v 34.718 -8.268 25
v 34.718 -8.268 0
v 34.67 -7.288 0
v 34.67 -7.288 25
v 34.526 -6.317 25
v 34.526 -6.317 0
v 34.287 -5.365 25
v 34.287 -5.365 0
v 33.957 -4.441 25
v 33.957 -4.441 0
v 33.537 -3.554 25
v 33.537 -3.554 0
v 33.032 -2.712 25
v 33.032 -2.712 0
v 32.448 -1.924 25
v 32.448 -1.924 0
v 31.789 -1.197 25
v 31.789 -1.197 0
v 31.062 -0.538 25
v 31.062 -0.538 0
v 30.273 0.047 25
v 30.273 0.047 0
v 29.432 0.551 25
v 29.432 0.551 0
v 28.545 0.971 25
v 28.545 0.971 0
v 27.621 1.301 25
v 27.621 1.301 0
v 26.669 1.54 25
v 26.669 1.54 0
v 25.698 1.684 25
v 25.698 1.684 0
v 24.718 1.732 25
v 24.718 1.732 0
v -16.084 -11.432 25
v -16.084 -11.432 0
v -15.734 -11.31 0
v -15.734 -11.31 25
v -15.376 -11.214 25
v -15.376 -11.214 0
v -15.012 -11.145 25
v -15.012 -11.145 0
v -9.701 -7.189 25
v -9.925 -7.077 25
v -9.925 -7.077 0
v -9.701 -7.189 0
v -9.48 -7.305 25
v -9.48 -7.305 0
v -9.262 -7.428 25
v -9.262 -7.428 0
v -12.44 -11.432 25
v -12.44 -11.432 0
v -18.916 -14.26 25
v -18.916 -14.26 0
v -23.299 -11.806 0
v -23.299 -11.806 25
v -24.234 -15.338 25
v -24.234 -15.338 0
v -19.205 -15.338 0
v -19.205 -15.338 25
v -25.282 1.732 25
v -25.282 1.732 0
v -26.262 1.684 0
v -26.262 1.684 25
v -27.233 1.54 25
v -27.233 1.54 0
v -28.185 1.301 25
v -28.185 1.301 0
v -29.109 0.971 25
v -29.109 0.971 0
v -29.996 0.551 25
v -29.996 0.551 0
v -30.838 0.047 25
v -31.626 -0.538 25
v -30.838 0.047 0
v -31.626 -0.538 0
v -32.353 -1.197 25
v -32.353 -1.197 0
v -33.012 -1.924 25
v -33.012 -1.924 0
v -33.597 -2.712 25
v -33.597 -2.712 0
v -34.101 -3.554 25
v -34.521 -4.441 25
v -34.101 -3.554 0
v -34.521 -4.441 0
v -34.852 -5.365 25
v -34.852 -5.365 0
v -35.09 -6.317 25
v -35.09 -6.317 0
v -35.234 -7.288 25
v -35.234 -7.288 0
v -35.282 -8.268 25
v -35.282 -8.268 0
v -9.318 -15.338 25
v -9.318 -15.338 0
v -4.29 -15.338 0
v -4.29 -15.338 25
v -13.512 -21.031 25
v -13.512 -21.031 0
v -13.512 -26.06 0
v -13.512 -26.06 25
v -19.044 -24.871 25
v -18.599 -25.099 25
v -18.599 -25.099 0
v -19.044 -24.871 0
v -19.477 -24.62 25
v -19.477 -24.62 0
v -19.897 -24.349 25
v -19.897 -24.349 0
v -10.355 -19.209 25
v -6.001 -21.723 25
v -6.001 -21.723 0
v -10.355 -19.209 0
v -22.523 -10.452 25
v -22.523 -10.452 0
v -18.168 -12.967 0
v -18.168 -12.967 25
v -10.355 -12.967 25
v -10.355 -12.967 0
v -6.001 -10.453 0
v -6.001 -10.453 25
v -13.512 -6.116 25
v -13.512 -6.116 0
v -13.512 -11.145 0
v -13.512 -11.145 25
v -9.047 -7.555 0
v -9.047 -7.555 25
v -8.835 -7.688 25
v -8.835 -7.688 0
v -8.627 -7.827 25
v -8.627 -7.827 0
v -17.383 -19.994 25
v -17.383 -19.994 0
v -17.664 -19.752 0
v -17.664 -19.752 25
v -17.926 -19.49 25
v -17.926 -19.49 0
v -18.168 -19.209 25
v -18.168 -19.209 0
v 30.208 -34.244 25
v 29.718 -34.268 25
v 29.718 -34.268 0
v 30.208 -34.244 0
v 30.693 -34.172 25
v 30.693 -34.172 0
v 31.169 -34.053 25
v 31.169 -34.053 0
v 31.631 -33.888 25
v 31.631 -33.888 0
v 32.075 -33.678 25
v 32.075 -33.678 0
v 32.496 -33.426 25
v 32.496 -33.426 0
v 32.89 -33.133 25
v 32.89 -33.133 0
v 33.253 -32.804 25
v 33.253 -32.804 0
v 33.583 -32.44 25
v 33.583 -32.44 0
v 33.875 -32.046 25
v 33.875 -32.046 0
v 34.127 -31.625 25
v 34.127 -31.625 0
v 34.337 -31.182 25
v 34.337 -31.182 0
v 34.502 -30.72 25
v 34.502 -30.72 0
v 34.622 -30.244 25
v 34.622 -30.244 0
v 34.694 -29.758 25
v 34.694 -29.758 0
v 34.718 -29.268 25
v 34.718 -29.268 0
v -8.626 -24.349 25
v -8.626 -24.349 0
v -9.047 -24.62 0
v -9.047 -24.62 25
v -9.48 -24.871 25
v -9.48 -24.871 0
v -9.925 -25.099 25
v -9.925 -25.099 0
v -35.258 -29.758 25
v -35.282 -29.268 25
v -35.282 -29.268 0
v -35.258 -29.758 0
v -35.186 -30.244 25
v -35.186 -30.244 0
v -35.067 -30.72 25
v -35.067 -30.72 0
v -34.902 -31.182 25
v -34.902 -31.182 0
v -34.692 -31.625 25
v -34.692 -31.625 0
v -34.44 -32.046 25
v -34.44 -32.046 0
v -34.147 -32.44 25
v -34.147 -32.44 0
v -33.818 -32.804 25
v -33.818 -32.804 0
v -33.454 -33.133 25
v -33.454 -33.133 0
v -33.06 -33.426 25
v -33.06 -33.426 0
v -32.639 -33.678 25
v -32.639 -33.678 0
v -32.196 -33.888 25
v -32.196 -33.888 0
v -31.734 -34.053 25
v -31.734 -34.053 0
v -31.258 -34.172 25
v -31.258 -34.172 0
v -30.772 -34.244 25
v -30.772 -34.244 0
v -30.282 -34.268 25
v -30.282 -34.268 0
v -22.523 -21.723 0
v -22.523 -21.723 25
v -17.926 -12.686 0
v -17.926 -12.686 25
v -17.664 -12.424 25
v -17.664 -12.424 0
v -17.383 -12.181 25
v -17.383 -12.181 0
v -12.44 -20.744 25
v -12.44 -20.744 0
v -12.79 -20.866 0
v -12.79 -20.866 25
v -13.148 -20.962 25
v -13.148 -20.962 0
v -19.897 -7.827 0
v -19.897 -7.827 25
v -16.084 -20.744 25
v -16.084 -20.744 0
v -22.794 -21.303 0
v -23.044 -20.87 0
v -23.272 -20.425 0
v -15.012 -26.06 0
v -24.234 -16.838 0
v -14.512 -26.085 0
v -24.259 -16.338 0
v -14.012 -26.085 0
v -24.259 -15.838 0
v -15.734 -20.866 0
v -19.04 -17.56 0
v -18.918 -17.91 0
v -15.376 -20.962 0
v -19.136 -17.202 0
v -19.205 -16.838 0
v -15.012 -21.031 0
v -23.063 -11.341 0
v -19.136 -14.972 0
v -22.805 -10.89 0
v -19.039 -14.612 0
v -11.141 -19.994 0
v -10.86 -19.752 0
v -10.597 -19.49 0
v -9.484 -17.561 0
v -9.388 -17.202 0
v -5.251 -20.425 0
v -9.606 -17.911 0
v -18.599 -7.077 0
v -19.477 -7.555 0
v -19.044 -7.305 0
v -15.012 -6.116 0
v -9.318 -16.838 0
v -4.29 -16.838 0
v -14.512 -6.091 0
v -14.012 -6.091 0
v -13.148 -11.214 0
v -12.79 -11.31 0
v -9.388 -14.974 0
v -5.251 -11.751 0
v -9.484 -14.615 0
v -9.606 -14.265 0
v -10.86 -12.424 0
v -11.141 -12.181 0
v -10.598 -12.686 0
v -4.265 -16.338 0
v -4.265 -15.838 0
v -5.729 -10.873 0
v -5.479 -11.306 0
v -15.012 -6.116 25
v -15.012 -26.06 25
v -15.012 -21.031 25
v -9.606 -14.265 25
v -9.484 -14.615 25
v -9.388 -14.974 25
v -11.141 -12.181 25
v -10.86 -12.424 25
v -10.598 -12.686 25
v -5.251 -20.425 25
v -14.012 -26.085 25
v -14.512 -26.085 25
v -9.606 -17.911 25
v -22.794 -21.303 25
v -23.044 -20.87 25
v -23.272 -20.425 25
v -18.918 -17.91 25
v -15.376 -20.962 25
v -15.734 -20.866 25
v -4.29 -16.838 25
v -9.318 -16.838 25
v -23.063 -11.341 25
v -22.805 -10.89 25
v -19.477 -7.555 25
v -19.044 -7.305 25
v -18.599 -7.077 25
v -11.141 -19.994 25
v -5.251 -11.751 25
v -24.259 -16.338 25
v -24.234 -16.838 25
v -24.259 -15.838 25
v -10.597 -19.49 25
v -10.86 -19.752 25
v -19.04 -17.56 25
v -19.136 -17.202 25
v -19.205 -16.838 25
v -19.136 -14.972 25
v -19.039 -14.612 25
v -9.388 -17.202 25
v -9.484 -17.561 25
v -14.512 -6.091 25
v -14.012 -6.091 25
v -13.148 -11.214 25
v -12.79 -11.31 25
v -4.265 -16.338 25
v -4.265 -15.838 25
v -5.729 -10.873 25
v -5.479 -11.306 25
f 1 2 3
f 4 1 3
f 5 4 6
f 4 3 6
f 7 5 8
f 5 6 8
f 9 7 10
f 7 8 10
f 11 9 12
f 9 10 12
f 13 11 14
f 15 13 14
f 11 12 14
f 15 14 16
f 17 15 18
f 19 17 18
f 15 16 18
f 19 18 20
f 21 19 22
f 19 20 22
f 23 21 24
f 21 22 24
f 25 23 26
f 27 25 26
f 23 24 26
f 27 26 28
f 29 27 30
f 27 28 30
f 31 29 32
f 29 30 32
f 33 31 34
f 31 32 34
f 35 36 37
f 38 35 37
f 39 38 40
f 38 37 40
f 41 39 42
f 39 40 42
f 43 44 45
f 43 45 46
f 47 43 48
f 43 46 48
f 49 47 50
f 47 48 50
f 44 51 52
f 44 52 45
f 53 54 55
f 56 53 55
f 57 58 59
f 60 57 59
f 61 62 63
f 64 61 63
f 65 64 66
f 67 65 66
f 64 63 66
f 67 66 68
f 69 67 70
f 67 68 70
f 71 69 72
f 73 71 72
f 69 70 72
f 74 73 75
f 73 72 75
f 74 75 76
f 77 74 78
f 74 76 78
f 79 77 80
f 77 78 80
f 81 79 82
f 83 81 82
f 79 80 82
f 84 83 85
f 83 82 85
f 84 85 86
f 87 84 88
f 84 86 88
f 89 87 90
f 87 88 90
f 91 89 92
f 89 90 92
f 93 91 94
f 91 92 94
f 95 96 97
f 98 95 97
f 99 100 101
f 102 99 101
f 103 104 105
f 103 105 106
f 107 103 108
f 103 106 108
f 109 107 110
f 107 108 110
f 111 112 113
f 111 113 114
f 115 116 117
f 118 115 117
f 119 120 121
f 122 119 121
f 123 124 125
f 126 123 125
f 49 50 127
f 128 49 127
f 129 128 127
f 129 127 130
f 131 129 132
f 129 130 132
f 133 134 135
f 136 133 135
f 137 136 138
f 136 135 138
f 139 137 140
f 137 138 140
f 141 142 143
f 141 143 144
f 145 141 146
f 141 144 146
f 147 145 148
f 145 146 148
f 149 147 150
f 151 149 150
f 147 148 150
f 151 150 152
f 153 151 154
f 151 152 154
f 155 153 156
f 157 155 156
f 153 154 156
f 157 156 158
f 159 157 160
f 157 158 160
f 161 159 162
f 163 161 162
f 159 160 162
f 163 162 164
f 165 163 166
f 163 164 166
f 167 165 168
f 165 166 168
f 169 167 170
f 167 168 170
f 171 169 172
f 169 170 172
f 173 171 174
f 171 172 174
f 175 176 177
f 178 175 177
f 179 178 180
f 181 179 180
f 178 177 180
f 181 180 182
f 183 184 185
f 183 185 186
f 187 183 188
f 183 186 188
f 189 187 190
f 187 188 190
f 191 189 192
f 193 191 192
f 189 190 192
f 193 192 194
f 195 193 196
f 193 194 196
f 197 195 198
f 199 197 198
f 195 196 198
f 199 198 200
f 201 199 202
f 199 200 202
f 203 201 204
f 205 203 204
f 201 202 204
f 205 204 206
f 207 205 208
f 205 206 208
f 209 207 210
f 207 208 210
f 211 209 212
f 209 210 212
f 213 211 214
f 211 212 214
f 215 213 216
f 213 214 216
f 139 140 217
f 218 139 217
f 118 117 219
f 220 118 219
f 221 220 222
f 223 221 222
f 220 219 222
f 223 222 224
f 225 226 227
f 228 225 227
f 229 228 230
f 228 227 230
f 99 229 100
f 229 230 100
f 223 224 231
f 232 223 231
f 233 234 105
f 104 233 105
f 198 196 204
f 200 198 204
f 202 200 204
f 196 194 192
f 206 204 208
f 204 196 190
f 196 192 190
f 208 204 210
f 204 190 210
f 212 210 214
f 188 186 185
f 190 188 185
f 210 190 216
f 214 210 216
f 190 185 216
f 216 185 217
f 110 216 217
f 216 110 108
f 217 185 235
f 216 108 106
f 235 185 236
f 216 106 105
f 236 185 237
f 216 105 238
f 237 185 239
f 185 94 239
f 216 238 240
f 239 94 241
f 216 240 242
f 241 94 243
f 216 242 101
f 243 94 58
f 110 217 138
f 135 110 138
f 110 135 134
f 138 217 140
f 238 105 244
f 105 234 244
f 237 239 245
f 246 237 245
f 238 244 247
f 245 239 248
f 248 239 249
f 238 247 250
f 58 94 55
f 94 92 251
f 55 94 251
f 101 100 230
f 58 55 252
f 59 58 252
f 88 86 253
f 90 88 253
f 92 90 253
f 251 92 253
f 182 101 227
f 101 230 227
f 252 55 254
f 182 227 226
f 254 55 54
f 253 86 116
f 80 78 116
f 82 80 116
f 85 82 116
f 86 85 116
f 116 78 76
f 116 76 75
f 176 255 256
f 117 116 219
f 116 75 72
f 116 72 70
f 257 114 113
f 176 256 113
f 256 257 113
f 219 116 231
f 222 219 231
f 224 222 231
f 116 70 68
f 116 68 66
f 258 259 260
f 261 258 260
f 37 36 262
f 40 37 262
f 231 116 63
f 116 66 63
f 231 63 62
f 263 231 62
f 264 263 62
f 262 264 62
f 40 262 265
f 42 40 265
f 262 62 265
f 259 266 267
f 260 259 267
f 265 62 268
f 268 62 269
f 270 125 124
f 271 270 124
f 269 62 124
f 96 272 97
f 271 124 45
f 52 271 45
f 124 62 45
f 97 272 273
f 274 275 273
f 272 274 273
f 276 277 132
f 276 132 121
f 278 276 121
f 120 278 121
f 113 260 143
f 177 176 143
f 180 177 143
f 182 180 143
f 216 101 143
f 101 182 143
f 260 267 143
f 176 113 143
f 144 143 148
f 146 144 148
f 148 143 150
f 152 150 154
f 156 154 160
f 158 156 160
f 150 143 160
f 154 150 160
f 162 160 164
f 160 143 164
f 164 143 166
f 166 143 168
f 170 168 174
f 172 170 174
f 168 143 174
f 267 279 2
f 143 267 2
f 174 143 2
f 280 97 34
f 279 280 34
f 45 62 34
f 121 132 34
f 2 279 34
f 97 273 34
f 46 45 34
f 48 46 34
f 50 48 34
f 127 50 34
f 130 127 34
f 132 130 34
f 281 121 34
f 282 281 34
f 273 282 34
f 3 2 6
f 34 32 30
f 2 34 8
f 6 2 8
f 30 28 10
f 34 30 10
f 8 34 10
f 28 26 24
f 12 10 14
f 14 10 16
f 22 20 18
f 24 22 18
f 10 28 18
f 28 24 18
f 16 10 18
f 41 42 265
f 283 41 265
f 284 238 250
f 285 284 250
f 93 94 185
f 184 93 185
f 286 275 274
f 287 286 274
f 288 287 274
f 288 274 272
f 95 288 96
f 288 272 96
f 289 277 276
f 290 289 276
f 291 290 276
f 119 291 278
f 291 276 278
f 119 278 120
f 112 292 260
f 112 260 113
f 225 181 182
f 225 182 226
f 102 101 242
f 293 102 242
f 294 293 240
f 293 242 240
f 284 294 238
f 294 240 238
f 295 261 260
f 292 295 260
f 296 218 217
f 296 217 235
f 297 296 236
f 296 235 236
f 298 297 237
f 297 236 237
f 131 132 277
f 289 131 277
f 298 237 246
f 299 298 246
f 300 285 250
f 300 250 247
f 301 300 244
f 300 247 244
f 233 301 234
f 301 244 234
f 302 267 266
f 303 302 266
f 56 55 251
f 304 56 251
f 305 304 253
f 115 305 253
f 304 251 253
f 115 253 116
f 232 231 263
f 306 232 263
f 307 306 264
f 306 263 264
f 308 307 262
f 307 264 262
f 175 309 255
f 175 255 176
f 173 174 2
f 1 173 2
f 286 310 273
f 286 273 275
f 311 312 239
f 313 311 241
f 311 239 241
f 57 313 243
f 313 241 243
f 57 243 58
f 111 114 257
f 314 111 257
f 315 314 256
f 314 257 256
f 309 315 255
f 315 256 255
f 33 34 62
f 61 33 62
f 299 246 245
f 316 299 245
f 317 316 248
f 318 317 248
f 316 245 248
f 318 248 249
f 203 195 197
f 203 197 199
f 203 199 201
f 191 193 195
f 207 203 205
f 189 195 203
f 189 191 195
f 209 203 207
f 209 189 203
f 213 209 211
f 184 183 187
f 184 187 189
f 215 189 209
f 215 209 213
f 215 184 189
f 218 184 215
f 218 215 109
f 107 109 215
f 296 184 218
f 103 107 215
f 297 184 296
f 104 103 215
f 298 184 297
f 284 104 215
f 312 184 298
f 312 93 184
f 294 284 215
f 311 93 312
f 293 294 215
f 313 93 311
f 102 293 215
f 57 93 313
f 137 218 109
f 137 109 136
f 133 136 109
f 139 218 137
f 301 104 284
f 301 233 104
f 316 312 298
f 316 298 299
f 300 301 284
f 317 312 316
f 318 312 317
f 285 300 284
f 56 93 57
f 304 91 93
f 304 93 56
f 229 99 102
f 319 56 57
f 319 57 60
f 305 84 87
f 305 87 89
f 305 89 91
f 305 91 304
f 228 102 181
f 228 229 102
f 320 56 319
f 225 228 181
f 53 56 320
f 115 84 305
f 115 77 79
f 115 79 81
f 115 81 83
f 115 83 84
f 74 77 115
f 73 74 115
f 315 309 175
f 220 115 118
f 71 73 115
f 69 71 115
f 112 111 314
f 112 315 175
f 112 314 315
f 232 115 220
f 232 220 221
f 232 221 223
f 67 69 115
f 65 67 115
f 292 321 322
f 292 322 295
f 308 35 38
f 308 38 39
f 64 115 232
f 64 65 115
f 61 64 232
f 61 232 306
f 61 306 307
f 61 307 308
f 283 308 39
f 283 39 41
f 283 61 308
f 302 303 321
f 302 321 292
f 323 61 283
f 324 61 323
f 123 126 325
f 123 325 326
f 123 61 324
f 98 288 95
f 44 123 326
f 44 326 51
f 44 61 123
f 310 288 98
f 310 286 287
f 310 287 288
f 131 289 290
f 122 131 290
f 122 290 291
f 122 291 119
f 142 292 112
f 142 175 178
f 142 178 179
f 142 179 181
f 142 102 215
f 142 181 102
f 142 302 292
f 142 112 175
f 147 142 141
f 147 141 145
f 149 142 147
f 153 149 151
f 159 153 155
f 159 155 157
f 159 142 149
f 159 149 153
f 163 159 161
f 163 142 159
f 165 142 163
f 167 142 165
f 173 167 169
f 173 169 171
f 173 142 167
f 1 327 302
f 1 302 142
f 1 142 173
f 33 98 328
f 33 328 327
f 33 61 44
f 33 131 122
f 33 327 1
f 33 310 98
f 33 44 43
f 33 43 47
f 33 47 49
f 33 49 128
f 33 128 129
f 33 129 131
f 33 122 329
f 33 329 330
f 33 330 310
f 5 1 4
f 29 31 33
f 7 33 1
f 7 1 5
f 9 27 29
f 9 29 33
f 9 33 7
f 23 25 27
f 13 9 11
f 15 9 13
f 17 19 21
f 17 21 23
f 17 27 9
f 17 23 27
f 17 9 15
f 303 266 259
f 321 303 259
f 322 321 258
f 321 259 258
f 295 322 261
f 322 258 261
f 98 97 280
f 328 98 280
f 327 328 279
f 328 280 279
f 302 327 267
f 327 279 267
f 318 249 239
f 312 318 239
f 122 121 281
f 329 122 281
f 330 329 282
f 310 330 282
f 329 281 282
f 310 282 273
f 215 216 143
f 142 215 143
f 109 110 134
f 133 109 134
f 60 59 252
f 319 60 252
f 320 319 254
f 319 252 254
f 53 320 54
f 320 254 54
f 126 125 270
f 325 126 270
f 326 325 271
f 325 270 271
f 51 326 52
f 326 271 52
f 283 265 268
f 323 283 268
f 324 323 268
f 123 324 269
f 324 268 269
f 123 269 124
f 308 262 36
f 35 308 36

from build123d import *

# Parameters (mm, degrees)
F1_DEPTH = 25


with BuildPart() as f1:
    # F0 (on Top) → F1 (new body)
    with BuildSketch(Plane.XY):
        with BuildLine():
            ThreePointArc((-35.28226, -29.26819), (-33.817794, -32.803724), (-30.28226, -34.26819))
            Line((-30.28226, -34.26819), (29.71774, -34.26819))
            ThreePointArc((29.71774, -34.26819), (33.253274, -32.803724), (34.71774, -29.26819))
            Line((34.71774, -29.26819), (34.71774, -8.26819))
            ThreePointArc((34.71774, -8.26819), (31.788808, -1.197122), (24.71774, 1.73181))
            Line((24.71774, 1.73181), (-25.28226, 1.73181))
            ThreePointArc((-25.28226, 1.73181), (-32.353327, -1.197122), (-35.28226, -8.26819))
            Line((-35.28226, -8.26819), (-35.28226, -29.26819))
        make_face()
        with BuildLine():
            ThreePointArc((-16.084487, -11.432007), (-15.556147, -11.258388), (-15.011794, -11.144518))
            Line((-15.011794, -11.144518), (-15.011794, -6.116113))
            ThreePointArc((-15.011794, -6.116113), (-14.261794, -6.087948), (-13.511794, -6.116113))
            Line((-13.511794, -6.116113), (-13.511794, -11.144518))
            ThreePointArc((-13.511794, -11.144518), (-12.967699, -11.258319), (-12.439598, -11.431812))
            Line((-12.439598, -11.431812), (-9.924919, -7.077315))
            ThreePointArc((-9.924919, -7.077315), (-9.59007, -7.246285), (-9.261794, -7.427694))
            ThreePointArc((-9.261794, -7.427694), (-8.940551, -7.621285), (-8.626794, -7.826787))
            Line((-8.626794, -7.826787), (-11.140977, -12.181479))
            ThreePointArc((-11.140977, -12.181479), (-10.72626, -12.552414), (-10.355325, -12.967131))
            Line((-10.355325, -12.967131), (-6.000633, -10.452948))
            ThreePointArc((-6.000633, -10.452948), (-5.60154, -11.087948), (-5.251161, -11.751073))
            Line((-5.251161, -11.751073), (-9.605852, -14.265255))
            ThreePointArc((-9.605852, -14.265255), (-9.432234, -14.793595), (-9.318364, -15.337948))
            Line((-9.318364, -15.337948), (-4.289958, -15.337948))
            ThreePointArc((-4.289958, -15.337948), (-4.261794, -16.087948), (-4.289958, -16.837948))
            Line((-4.289958, -16.837948), (-9.318364, -16.837948))
            ThreePointArc((-9.318364, -16.837948), (-9.432235, -17.382306), (-9.605856, -17.91065))
            Line((-9.605856, -17.91065), (-5.251199, -20.424903))
            Line((-5.251199, -20.424903), (-6.000683, -21.723021))
            Line((-6.000683, -21.723021), (-10.355352, -19.2088))
            ThreePointArc((-10.355352, -19.2088), (-10.726087, -19.623309), (-11.14056, -19.994084))
            Line((-11.14056, -19.994084), (-8.626357, -24.348811))
            ThreePointArc((-8.626357, -24.348811), (-9.261794, -24.748202), (-9.925395, -25.098811))
            Line((-9.925395, -25.098811), (-12.439598, -20.744084))
            ThreePointArc((-12.439598, -20.744084), (-12.967699, -20.917577), (-13.511794, -21.031378))
            Line((-13.511794, -21.031378), (-13.511794, -26.059783))
            ThreePointArc((-13.511794, -26.059783), (-14.261794, -26.087948), (-15.011794, -26.059783))
            Line((-15.011794, -26.059783), (-15.011794, -21.031378))
            ThreePointArc((-15.011794, -21.031378), (-15.555889, -20.917577), (-16.08399, -20.744084))
            Line((-16.08399, -20.744084), (-18.598669, -25.098581))
            ThreePointArc((-18.598669, -25.098581), (-19.261794, -24.748202), (-19.896794, -24.349109))
            Line((-19.896794, -24.349109), (-17.383028, -19.994084))
            ThreePointArc((-17.383028, -19.994084), (-17.797328, -19.623482), (-18.16793, -19.209182))
            Line((-18.16793, -19.209182), (-22.522955, -21.722948))
            ThreePointArc((-22.522955, -21.722948), (-22.922048, -21.087948), (-23.272427, -20.424823))
            Line((-23.272427, -20.424823), (-18.91793, -17.910144))
            ThreePointArc((-18.91793, -17.910144), (-19.091423, -17.382043), (-19.205224, -16.837948))
            Line((-19.205224, -16.837948), (-24.233629, -16.837948))
            ThreePointArc((-24.233629, -16.837948), (-24.261794, -16.087948), (-24.233629, -15.337948))
            Line((-24.233629, -15.337948), (-19.205224, -15.337948))
            ThreePointArc((-19.205224, -15.337948), (-19.090659, -14.791005), (-18.915777, -14.260262))
            Line((-18.915777, -14.260262), (-23.298524, -11.805716))
            ThreePointArc((-23.298524, -11.805716), (-22.936977, -11.113895), (-22.522569, -10.452383))
            Line((-22.522569, -10.452383), (-18.167881, -12.966653))
            ThreePointArc((-18.167881, -12.966653), (-17.797112, -12.552198), (-17.382611, -12.181479))
            Line((-17.382611, -12.181479), (-19.896794, -7.826787))
            ThreePointArc((-19.896794, -7.826787), (-19.261794, -7.427694), (-18.598669, -7.077315))
            Line((-18.598669, -7.077315), (-16.084487, -11.432007))
        make_face(mode=Mode.SUBTRACT)
    extrude(amount=F1_DEPTH)


solid = f1.part
